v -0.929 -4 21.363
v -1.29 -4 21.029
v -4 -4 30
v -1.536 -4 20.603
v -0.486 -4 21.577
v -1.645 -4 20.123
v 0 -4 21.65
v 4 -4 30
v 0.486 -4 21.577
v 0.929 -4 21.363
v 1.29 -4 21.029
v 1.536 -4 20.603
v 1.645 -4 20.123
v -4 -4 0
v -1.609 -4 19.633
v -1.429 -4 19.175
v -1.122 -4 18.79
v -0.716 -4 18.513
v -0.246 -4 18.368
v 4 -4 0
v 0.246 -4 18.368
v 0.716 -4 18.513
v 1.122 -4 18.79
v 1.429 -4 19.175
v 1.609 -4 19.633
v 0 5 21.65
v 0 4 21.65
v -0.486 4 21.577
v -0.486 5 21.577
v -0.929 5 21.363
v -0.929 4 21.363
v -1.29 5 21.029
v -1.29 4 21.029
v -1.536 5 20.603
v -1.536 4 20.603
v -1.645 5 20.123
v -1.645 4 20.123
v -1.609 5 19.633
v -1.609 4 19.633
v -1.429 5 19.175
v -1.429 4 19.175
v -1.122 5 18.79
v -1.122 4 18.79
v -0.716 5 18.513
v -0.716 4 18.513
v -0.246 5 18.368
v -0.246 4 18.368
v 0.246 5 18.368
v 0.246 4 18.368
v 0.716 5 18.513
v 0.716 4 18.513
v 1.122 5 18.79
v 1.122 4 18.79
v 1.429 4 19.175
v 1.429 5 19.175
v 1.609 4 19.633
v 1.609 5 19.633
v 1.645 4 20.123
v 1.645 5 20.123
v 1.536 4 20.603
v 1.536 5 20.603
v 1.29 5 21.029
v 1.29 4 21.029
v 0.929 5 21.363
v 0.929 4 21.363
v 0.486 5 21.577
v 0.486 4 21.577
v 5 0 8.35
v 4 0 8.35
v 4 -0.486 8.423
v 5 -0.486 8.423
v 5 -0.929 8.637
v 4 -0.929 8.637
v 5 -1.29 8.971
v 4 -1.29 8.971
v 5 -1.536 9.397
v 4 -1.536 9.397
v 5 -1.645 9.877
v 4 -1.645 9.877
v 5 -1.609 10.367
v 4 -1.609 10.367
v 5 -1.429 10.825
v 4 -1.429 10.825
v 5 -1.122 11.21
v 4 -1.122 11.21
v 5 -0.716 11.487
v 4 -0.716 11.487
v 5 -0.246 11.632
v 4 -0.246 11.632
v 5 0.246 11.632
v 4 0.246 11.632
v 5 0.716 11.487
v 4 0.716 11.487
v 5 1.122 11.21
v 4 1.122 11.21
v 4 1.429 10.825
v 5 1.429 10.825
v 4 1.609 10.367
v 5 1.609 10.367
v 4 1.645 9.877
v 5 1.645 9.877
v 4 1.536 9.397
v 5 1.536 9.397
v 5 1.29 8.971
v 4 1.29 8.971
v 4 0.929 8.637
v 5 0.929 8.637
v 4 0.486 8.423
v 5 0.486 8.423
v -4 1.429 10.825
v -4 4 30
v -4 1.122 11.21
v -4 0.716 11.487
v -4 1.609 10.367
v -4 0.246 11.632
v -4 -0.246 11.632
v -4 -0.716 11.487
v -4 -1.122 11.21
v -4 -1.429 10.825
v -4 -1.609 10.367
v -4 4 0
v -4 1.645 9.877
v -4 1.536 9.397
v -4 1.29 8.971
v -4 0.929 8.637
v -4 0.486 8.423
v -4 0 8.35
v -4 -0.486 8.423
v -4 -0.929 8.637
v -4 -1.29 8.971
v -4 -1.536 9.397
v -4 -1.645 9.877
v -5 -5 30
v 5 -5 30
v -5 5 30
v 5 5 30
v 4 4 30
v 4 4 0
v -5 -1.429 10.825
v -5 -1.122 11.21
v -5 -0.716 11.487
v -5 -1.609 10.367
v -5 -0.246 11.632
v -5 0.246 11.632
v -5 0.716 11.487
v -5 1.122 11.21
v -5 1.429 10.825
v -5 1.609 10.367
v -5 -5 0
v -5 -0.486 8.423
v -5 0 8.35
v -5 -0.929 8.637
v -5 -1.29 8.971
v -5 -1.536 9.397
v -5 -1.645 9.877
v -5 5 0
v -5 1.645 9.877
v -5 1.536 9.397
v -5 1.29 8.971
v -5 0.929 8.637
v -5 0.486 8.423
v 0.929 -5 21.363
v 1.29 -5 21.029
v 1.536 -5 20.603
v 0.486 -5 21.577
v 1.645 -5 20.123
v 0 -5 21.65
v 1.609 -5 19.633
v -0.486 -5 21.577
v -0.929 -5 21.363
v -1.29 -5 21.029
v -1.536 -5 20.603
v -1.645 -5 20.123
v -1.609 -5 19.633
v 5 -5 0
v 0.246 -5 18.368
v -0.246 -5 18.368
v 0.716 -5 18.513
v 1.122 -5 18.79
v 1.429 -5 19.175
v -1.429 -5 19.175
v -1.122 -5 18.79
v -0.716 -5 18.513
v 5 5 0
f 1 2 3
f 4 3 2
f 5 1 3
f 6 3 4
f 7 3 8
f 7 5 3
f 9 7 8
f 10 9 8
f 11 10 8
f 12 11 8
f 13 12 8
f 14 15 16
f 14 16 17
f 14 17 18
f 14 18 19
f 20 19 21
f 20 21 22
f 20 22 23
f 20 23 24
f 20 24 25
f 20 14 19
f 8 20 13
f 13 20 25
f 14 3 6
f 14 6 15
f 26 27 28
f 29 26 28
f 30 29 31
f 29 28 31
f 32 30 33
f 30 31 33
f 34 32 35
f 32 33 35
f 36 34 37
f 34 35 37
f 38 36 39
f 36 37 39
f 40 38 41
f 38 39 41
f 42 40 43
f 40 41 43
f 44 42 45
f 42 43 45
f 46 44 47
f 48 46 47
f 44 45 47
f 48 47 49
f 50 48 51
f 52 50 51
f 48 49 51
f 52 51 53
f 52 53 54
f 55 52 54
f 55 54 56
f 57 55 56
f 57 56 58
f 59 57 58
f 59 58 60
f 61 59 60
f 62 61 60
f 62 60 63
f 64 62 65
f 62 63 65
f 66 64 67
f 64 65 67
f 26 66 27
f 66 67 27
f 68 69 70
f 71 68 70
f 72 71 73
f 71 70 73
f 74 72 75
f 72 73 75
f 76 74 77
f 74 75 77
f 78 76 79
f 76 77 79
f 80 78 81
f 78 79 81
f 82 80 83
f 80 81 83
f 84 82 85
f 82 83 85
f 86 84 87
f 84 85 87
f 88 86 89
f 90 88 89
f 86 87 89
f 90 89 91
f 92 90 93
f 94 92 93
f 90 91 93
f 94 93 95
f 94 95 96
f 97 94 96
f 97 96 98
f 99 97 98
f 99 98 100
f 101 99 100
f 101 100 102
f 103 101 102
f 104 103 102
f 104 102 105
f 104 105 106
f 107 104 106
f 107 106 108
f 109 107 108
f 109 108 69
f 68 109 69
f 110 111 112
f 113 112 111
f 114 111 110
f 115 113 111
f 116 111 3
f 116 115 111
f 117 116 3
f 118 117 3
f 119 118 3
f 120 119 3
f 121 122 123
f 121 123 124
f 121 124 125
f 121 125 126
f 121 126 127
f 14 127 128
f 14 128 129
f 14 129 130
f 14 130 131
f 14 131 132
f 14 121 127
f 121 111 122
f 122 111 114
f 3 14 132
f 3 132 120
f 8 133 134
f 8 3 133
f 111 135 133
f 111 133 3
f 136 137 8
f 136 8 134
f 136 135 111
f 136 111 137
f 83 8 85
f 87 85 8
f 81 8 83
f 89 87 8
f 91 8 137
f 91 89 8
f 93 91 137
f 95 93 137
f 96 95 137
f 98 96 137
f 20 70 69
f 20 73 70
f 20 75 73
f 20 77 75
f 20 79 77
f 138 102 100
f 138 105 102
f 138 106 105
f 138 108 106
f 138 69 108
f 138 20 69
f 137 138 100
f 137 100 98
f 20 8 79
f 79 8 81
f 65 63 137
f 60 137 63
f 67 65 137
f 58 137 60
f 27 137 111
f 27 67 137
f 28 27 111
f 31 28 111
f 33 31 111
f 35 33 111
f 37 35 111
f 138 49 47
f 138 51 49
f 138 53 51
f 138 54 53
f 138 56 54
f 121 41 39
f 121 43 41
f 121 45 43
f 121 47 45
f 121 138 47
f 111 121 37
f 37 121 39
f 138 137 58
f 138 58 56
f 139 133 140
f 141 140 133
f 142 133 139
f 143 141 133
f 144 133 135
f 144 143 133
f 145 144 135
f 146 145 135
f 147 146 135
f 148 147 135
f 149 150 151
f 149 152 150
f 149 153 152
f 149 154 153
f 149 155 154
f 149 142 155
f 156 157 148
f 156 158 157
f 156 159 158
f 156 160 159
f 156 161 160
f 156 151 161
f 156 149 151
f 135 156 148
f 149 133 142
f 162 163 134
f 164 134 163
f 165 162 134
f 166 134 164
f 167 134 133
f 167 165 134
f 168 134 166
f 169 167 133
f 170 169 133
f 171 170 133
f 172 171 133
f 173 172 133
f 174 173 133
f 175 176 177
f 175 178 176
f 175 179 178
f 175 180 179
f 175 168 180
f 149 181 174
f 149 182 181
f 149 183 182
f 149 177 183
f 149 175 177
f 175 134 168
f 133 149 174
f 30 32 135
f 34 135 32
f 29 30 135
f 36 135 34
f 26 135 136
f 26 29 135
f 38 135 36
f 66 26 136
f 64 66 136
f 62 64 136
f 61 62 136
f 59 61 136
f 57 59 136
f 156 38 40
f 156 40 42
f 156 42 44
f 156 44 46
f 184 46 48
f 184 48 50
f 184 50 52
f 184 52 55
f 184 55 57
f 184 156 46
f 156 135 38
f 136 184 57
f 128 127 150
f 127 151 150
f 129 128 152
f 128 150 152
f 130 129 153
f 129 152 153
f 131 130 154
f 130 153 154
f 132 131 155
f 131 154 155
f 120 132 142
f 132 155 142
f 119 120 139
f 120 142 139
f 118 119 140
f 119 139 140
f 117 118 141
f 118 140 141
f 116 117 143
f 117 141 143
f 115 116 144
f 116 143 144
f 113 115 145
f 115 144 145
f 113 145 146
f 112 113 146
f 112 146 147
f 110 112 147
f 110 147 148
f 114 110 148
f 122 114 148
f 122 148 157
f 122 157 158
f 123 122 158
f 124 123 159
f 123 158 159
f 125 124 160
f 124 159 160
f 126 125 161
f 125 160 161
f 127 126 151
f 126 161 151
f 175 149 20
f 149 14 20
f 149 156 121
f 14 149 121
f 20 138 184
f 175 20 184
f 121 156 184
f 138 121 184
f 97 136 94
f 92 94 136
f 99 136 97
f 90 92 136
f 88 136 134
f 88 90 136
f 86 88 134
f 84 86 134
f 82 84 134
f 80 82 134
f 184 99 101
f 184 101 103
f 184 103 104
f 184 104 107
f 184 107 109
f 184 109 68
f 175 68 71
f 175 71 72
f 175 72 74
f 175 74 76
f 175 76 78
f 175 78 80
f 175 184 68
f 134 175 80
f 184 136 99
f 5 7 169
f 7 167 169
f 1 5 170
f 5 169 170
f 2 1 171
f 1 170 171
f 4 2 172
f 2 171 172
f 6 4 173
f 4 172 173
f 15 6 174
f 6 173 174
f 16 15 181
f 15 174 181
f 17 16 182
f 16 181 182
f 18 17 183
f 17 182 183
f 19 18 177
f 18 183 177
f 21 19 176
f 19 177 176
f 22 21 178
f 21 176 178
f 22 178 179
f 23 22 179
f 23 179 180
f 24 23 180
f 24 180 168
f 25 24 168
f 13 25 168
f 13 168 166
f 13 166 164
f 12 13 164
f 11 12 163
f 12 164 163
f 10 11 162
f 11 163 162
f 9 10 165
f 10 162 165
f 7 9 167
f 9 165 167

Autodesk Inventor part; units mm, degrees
ref_plane "YZ Plane" through (0, 0, 0) normal (1, 0, 0) x (0, 1, 0)
ref_plane "XZ Plane" through (0, 0, 0) normal (0, 1, 0) x (-1, 0, 0)
ref_plane "XY Plane" through (0, 0, 0) normal (0, 0, 1) x (1, 0, 0)
sketch "スケッチ1" plane through (0, 0, 0) normal (0, 0, 1) x (1, 0, 0)
  line L0 (5, -5) -> (-5, -5)
  line L1 (-5, -5) -> (-5, 5)
  line L2 (-5, 5) -> (5, 5)
  line L3 (5, 5) -> (5, -5)
  line L4 (5, -5) -> (-5, 5) construction
  line L5 (-5, -5) -> (5, 5) construction
  line L6 (4, 4) -> (-4, 4)
  line L7 (-4, 4) -> (-4, -4)
  line L8 (-4, -4) -> (4, -4)
  line L9 (4, -4) -> (4, 4)
  point P0 (0, 0)
  dimension "d0" = 10
  dimension "d1" = 10
  dimension "d2" = 1
extrude "押し出し1" add sketch "スケッチ1" along normal blind 30
sketch "スケッチ2" plane through (5, -5, 0) normal (1, 0, 0) x (0, 0, -1)
  line L0 (-30, 10) -> (-30, 0) projected
  line L1 (-30, 5) -> (0, 5)
  line L2 (0, 0) -> (0, 10) projected
  point P0 (-10, 5)
  dimension "d5" = 10
hole "穴1" at (5, 0, 10) direction (-1, 0, 0) diameter 3.3 end through all
sketch "スケッチ3" plane through (-5, 5, 0) normal (0, 1, 0) x (1, 0, 0)
  line L0 (5, 0) -> (5, -30)
  line L1 (1, -30) -> (9, -30) projected
  line L2 (10, 0) -> (0, 0) projected
  point P0 (5, -20)
  dimension "d13" = 20
hole "穴2" at (0, 5, 20) direction (0, -1, 0) diameter 3.3 end through all
properties part number "small_kaku_1010_santen"
